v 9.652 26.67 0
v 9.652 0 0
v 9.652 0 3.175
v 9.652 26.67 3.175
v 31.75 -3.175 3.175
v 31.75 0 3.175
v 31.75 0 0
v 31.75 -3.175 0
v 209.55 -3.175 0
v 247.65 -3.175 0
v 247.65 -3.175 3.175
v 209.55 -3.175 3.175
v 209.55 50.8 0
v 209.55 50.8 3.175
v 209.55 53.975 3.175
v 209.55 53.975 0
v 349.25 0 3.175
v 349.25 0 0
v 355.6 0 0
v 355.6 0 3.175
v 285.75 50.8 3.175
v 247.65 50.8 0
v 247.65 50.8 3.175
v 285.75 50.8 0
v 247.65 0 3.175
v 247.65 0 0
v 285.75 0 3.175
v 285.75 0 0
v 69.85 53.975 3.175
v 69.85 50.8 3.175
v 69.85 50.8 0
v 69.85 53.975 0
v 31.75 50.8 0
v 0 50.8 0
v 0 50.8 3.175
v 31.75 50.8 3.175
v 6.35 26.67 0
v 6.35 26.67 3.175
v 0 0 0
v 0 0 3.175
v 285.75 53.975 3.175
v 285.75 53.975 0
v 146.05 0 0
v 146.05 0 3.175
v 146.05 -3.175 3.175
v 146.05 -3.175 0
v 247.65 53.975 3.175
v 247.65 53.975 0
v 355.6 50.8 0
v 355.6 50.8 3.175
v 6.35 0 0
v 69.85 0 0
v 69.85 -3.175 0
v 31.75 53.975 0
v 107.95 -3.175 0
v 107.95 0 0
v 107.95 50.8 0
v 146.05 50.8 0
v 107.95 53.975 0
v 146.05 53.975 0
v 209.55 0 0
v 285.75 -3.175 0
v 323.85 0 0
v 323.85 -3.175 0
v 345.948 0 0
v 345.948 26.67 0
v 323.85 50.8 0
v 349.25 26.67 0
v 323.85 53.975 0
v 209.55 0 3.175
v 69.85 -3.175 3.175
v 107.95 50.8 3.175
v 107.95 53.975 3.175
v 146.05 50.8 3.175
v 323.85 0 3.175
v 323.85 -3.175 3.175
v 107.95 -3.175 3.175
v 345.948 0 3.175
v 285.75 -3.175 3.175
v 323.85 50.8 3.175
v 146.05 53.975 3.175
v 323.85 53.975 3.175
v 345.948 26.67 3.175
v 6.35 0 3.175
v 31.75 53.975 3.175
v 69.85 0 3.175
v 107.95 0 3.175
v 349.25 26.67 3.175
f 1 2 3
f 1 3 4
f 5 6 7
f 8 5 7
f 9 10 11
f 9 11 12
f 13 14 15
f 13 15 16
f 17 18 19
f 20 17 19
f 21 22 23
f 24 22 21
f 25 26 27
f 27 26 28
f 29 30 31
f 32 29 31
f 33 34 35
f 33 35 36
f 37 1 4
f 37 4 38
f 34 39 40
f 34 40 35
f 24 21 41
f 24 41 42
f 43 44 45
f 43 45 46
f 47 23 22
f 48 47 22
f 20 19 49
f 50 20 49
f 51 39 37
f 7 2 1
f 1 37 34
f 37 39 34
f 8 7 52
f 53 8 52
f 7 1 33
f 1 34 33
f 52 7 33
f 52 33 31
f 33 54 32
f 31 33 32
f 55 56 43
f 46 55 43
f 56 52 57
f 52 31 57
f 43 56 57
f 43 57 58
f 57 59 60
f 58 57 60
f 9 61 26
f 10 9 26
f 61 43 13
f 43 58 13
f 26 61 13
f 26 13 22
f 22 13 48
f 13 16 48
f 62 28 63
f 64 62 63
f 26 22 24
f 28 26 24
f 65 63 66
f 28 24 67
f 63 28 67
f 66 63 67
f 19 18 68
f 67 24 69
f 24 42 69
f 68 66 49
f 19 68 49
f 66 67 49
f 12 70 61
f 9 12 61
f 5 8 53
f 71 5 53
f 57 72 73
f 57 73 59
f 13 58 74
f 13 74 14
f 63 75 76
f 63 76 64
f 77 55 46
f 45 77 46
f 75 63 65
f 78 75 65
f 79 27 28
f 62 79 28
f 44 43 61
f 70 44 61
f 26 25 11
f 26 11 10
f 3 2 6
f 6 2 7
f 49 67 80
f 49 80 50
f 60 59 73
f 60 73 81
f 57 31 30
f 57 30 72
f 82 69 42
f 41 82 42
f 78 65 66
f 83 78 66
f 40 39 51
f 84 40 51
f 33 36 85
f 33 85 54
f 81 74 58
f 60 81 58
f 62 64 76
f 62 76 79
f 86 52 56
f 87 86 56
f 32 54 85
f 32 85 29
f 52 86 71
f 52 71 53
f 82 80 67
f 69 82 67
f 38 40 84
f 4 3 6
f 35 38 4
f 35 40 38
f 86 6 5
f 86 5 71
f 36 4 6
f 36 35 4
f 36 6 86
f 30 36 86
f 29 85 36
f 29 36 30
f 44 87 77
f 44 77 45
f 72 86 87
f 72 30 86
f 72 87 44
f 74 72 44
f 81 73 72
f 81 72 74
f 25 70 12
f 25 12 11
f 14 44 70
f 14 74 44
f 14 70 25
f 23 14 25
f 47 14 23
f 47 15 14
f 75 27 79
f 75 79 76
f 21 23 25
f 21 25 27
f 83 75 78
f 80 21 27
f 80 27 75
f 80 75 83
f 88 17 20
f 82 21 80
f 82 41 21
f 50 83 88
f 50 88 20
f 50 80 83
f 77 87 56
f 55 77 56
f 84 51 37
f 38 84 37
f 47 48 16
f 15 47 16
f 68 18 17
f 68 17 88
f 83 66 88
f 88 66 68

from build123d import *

# Parameters (mm, degrees)
SKETCH1_W               = 355.6
SKETCH1_H               = 50.8
BOSS_EXTRUDE1_DEPTH     = 3.175
SKETCH2_W               = 38.1
SKETCH2_H               = 3.175
BOSS_EXTRUDE2_DEPTH     = 3.175
MIRROR2_COPY_1_SKETCH_W = 38.1
MIRROR2_COPY_1_SKETCH_H = 3.175
MIRROR2_COPY_1_DEPTH    = 3.175
SKETCH3_W               = 3.302
SKETCH3_H               = 26.67
CUT_EXTRUDE1_DEPTH      = 3.175


with BuildPart() as part:
    # Sketch1 → Boss-Extrude1 (new body)
    with BuildSketch(Plane.XY):
        with Locations((177.8, 25.4)):
            Rectangle(SKETCH1_W, SKETCH1_H)
    extrude(amount=BOSS_EXTRUDE1_DEPTH)

    # Sketch2 → Boss-Extrude2 (add)
    with BuildSketch(Plane(origin=(0, 50.8, 0), x_dir=(1, 0, 0), z_dir=(0, 1, 0))):
        with Locations((50.8, -1.5875)):
            Rectangle(SKETCH2_W, SKETCH2_H)
        with Locations((127, -1.5875)):
            Rectangle(SKETCH2_W, SKETCH2_H)
    boss_extrude2 = extrude(amount=BOSS_EXTRUDE2_DEPTH)

    # Mirror1: Boss-Extrude2 across plane
    add(boss_extrude2.mirror(Plane.ZY.offset(-177.8)))

    # Mirror2: Boss-Extrude2 across plane
    add(boss_extrude2.mirror(Plane.ZX.offset(25.4)))

    # Mirror2 copy 1 sketch → Mirror2 copy 1 (add)
    with BuildSketch(Plane(origin=(355.6, 0, 0), x_dir=(-1, 0, 0), z_dir=(0, -1, 0))):
        with Locations((50.8, -1.5875)):
            Rectangle(MIRROR2_COPY_1_SKETCH_W, MIRROR2_COPY_1_SKETCH_H)
        with Locations((127, -1.5875)):
            Rectangle(MIRROR2_COPY_1_SKETCH_W, MIRROR2_COPY_1_SKETCH_H)
    extrude(amount=MIRROR2_COPY_1_DEPTH)

    # Sketch3 → Cut-Extrude1 (cut)
    with BuildSketch(Plane(origin=(0, 0, 0), x_dir=(-1, 0, 0), z_dir=(0, 0, -1))):
        with Locations((-8.001, 13.335)):
            Rectangle(SKETCH3_W, SKETCH3_H)
    cut_extrude1 = extrude(amount=-CUT_EXTRUDE1_DEPTH, mode=Mode.SUBTRACT)

    # Mirror3: Cut-Extrude1 across plane
    add(cut_extrude1.mirror(Plane.ZY.offset(-177.8)), mode=Mode.SUBTRACT)


solid = part.part
